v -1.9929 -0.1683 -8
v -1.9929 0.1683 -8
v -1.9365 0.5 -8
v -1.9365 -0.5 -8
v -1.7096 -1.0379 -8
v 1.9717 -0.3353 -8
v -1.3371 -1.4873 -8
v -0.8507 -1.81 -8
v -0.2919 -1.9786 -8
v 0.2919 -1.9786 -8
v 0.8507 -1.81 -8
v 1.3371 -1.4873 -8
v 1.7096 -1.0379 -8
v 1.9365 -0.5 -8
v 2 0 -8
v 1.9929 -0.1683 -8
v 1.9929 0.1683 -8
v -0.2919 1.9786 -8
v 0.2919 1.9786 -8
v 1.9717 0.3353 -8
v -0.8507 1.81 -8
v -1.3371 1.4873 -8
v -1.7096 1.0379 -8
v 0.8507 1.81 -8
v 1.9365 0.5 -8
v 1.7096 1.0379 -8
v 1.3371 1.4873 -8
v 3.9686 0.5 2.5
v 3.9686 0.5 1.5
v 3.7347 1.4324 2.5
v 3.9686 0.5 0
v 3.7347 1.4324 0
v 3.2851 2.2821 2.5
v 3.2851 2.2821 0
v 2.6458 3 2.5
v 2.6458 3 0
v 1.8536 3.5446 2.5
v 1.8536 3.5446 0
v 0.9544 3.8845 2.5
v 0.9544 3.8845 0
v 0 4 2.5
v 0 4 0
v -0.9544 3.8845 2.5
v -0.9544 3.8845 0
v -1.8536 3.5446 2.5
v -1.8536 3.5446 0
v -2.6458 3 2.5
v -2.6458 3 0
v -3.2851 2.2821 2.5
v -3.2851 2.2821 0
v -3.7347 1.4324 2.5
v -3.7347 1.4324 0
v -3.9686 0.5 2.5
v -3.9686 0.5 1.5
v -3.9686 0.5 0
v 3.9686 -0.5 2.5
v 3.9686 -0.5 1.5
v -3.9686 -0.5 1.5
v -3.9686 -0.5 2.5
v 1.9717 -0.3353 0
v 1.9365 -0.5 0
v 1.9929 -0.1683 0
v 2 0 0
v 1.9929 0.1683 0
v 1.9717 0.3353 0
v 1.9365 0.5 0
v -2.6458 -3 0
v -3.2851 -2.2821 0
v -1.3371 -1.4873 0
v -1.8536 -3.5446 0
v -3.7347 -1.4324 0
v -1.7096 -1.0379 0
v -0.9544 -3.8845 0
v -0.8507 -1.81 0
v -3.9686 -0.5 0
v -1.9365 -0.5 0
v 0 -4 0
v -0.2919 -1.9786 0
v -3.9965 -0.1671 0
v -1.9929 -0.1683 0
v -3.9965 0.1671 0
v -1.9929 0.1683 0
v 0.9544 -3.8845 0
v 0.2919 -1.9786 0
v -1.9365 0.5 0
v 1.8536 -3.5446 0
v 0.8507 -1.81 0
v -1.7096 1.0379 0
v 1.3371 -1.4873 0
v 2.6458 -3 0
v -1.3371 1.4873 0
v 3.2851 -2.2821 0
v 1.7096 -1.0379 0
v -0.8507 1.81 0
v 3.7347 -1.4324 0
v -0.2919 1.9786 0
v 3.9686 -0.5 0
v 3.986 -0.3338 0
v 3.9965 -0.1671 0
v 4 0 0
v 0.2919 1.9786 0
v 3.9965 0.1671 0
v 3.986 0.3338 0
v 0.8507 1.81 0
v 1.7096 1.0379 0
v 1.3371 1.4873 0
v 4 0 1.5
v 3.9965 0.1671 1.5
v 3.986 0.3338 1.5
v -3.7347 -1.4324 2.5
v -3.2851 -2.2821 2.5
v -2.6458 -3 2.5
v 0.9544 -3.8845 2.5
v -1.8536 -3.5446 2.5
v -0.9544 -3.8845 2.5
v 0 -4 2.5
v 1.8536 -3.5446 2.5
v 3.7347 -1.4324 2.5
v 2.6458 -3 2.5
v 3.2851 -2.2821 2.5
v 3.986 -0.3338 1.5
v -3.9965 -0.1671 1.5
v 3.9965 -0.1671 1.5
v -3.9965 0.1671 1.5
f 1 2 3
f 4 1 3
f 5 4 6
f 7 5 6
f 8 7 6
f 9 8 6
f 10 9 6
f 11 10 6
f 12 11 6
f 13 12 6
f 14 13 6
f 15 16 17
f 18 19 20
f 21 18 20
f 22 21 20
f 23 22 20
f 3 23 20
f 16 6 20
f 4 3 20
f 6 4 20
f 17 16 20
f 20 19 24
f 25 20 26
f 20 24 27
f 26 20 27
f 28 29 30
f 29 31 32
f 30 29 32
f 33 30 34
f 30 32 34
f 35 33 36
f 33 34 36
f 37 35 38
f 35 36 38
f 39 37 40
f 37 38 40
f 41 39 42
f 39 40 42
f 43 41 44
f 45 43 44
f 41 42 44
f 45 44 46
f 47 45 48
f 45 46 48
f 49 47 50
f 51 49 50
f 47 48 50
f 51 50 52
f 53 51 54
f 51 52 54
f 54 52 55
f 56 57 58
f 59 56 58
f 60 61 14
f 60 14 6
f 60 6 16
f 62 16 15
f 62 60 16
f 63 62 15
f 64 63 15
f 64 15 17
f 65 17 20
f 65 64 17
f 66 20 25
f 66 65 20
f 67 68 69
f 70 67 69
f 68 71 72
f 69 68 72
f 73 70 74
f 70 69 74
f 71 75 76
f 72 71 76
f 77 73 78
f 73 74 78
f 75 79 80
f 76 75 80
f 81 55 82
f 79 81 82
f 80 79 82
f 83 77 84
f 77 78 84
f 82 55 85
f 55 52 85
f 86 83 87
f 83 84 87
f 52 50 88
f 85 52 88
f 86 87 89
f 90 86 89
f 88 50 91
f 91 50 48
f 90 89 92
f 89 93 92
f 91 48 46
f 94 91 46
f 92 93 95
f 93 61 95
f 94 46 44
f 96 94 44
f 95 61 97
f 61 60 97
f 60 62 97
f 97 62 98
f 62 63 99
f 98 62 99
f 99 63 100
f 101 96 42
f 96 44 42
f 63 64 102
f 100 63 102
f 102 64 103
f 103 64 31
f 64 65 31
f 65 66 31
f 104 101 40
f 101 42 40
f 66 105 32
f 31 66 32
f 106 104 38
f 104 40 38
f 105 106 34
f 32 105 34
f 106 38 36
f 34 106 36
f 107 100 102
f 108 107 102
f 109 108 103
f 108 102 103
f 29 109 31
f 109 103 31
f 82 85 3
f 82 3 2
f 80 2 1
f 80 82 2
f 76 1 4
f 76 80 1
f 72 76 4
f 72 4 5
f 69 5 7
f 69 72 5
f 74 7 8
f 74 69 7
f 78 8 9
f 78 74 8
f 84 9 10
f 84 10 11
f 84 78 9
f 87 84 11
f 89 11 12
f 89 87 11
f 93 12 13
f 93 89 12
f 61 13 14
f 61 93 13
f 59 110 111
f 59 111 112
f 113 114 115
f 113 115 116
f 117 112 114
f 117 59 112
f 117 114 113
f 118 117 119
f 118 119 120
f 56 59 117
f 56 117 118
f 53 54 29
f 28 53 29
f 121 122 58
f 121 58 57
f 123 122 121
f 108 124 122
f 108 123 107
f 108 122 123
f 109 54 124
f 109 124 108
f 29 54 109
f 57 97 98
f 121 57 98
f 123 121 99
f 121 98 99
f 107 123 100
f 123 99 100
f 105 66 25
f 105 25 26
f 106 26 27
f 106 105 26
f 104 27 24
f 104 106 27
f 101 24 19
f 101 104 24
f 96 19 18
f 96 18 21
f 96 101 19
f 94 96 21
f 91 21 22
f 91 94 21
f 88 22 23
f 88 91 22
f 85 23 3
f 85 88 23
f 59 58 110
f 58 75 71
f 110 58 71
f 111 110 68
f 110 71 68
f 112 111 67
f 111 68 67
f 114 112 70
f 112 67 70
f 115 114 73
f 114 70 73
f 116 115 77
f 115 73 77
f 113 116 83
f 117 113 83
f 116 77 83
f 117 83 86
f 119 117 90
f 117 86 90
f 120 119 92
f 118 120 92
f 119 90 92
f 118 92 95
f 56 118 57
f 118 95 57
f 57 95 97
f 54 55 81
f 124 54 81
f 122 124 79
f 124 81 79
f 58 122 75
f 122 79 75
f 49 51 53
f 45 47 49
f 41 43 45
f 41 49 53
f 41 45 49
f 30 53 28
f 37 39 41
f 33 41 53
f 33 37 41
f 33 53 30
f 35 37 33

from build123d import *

# Parameters (mm, degrees)
F1_DEPTH = 8
F2_DEPTH = 2.5
F3_DEPTH = 1.5


# Not quite as in the source:
# - a feature names something its author has since deleted; it is built from what else it names


with BuildPart() as f1:
    # F0 (on Top) → F1 (new body)
    with BuildSketch(Plane.XY):
        with BuildLine():
            Line((-1.9364916731, 0.5), (1.9364916731, 0.5))
            ThreePointArc((1.9364916731, 0.5), (0, 2), (-1.9364916731, 0.5))
        make_face()
        with BuildLine():
            ThreePointArc((2, 0), (1.9840593925, 0.252008585), (1.9364916731, 0.5))
            Line((1.9364916731, 0.5), (-1.9364916731, 0.5))
            ThreePointArc((-1.9364916731, 0.5), (-2, 0), (-1.9364916731, -0.5))
            Line((-1.9364916731, -0.5), (1.9364916731, -0.5))
            ThreePointArc((1.9364916731, -0.5), (1.9840593925, -0.252008585), (2, 0))
        make_face()
        with BuildLine():
            ThreePointArc((-1.9364916731, -0.5), (0, -2), (1.9364916731, -0.5))
            Line((1.9364916731, -0.5), (-1.9364916731, -0.5))
        make_face()
    extrude(amount=-F1_DEPTH)

    # F0 (on Top) → F2 (join)
    with BuildSketch(Plane.XY):
        with BuildLine():
            ThreePointArc((-3.9686269666, -0.5), (0, -4), (3.9686269666, -0.5))
            Line((3.9686269666, -0.5), (1.9364916731, -0.5))
            ThreePointArc((1.9364916731, -0.5), (0, -2), (-1.9364916731, -0.5))
            Line((-1.9364916731, -0.5), (-3.9686269666, -0.5))
        make_face()
        with BuildLine():
            Line((1.9364916731, 0.5), (3.9686269666, 0.5))
            ThreePointArc((3.9686269666, 0.5), (0, 4), (-3.9686269666, 0.5))
            Line((-3.9686269666, 0.5), (-1.9364916731, 0.5))
            ThreePointArc((-1.9364916731, 0.5), (0, 2), (1.9364916731, 0.5))
        make_face()
        with BuildLine():
            Line((-1.9364916731, 0.5), (1.9364916731, 0.5))
            ThreePointArc((1.9364916731, 0.5), (0, 2), (-1.9364916731, 0.5))
        make_face()
        with BuildLine():
            ThreePointArc((-1.9364916731, -0.5), (0, -2), (1.9364916731, -0.5))
            Line((1.9364916731, -0.5), (-1.9364916731, -0.5))
        make_face()
    extrude(amount=F2_DEPTH)

    # F0 (on Top) → F3 (join)
    with BuildSketch(Plane.XY):
        with BuildLine():
            Line((-1.9364916731, 0.5), (-3.9686269666, 0.5))
            ThreePointArc((-3.9686269666, 0.5), (-4, 0), (-3.9686269666, -0.5))
            Line((-3.9686269666, -0.5), (-1.9364916731, -0.5))
            ThreePointArc((-1.9364916731, -0.5), (-2, 0), (-1.9364916731, 0.5))
        make_face()
        with BuildLine():
            ThreePointArc((2, 0), (1.9840593925, 0.252008585), (1.9364916731, 0.5))
            Line((1.9364916731, 0.5), (-1.9364916731, 0.5))
            ThreePointArc((-1.9364916731, 0.5), (-2, 0), (-1.9364916731, -0.5))
            Line((-1.9364916731, -0.5), (1.9364916731, -0.5))
            ThreePointArc((1.9364916731, -0.5), (1.9840593925, -0.252008585), (2, 0))
        make_face()
        with BuildLine():
            ThreePointArc((3.9686269666, -0.5), (3.9921490369, -0.2504916502), (4, 0))
            ThreePointArc((4, 0), (3.9921490369, 0.2504916502), (3.9686269666, 0.5))
            Line((3.9686269666, 0.5), (1.9364916731, 0.5))
            ThreePointArc((1.9364916731, 0.5), (1.9840593925, 0.252008585), (2, 0))
            ThreePointArc((2, 0), (1.9840593925, -0.252008585), (1.9364916731, -0.5))
            Line((1.9364916731, -0.5), (3.9686269666, -0.5))
        make_face()
    extrude(amount=F3_DEPTH)


solid = f1.part
